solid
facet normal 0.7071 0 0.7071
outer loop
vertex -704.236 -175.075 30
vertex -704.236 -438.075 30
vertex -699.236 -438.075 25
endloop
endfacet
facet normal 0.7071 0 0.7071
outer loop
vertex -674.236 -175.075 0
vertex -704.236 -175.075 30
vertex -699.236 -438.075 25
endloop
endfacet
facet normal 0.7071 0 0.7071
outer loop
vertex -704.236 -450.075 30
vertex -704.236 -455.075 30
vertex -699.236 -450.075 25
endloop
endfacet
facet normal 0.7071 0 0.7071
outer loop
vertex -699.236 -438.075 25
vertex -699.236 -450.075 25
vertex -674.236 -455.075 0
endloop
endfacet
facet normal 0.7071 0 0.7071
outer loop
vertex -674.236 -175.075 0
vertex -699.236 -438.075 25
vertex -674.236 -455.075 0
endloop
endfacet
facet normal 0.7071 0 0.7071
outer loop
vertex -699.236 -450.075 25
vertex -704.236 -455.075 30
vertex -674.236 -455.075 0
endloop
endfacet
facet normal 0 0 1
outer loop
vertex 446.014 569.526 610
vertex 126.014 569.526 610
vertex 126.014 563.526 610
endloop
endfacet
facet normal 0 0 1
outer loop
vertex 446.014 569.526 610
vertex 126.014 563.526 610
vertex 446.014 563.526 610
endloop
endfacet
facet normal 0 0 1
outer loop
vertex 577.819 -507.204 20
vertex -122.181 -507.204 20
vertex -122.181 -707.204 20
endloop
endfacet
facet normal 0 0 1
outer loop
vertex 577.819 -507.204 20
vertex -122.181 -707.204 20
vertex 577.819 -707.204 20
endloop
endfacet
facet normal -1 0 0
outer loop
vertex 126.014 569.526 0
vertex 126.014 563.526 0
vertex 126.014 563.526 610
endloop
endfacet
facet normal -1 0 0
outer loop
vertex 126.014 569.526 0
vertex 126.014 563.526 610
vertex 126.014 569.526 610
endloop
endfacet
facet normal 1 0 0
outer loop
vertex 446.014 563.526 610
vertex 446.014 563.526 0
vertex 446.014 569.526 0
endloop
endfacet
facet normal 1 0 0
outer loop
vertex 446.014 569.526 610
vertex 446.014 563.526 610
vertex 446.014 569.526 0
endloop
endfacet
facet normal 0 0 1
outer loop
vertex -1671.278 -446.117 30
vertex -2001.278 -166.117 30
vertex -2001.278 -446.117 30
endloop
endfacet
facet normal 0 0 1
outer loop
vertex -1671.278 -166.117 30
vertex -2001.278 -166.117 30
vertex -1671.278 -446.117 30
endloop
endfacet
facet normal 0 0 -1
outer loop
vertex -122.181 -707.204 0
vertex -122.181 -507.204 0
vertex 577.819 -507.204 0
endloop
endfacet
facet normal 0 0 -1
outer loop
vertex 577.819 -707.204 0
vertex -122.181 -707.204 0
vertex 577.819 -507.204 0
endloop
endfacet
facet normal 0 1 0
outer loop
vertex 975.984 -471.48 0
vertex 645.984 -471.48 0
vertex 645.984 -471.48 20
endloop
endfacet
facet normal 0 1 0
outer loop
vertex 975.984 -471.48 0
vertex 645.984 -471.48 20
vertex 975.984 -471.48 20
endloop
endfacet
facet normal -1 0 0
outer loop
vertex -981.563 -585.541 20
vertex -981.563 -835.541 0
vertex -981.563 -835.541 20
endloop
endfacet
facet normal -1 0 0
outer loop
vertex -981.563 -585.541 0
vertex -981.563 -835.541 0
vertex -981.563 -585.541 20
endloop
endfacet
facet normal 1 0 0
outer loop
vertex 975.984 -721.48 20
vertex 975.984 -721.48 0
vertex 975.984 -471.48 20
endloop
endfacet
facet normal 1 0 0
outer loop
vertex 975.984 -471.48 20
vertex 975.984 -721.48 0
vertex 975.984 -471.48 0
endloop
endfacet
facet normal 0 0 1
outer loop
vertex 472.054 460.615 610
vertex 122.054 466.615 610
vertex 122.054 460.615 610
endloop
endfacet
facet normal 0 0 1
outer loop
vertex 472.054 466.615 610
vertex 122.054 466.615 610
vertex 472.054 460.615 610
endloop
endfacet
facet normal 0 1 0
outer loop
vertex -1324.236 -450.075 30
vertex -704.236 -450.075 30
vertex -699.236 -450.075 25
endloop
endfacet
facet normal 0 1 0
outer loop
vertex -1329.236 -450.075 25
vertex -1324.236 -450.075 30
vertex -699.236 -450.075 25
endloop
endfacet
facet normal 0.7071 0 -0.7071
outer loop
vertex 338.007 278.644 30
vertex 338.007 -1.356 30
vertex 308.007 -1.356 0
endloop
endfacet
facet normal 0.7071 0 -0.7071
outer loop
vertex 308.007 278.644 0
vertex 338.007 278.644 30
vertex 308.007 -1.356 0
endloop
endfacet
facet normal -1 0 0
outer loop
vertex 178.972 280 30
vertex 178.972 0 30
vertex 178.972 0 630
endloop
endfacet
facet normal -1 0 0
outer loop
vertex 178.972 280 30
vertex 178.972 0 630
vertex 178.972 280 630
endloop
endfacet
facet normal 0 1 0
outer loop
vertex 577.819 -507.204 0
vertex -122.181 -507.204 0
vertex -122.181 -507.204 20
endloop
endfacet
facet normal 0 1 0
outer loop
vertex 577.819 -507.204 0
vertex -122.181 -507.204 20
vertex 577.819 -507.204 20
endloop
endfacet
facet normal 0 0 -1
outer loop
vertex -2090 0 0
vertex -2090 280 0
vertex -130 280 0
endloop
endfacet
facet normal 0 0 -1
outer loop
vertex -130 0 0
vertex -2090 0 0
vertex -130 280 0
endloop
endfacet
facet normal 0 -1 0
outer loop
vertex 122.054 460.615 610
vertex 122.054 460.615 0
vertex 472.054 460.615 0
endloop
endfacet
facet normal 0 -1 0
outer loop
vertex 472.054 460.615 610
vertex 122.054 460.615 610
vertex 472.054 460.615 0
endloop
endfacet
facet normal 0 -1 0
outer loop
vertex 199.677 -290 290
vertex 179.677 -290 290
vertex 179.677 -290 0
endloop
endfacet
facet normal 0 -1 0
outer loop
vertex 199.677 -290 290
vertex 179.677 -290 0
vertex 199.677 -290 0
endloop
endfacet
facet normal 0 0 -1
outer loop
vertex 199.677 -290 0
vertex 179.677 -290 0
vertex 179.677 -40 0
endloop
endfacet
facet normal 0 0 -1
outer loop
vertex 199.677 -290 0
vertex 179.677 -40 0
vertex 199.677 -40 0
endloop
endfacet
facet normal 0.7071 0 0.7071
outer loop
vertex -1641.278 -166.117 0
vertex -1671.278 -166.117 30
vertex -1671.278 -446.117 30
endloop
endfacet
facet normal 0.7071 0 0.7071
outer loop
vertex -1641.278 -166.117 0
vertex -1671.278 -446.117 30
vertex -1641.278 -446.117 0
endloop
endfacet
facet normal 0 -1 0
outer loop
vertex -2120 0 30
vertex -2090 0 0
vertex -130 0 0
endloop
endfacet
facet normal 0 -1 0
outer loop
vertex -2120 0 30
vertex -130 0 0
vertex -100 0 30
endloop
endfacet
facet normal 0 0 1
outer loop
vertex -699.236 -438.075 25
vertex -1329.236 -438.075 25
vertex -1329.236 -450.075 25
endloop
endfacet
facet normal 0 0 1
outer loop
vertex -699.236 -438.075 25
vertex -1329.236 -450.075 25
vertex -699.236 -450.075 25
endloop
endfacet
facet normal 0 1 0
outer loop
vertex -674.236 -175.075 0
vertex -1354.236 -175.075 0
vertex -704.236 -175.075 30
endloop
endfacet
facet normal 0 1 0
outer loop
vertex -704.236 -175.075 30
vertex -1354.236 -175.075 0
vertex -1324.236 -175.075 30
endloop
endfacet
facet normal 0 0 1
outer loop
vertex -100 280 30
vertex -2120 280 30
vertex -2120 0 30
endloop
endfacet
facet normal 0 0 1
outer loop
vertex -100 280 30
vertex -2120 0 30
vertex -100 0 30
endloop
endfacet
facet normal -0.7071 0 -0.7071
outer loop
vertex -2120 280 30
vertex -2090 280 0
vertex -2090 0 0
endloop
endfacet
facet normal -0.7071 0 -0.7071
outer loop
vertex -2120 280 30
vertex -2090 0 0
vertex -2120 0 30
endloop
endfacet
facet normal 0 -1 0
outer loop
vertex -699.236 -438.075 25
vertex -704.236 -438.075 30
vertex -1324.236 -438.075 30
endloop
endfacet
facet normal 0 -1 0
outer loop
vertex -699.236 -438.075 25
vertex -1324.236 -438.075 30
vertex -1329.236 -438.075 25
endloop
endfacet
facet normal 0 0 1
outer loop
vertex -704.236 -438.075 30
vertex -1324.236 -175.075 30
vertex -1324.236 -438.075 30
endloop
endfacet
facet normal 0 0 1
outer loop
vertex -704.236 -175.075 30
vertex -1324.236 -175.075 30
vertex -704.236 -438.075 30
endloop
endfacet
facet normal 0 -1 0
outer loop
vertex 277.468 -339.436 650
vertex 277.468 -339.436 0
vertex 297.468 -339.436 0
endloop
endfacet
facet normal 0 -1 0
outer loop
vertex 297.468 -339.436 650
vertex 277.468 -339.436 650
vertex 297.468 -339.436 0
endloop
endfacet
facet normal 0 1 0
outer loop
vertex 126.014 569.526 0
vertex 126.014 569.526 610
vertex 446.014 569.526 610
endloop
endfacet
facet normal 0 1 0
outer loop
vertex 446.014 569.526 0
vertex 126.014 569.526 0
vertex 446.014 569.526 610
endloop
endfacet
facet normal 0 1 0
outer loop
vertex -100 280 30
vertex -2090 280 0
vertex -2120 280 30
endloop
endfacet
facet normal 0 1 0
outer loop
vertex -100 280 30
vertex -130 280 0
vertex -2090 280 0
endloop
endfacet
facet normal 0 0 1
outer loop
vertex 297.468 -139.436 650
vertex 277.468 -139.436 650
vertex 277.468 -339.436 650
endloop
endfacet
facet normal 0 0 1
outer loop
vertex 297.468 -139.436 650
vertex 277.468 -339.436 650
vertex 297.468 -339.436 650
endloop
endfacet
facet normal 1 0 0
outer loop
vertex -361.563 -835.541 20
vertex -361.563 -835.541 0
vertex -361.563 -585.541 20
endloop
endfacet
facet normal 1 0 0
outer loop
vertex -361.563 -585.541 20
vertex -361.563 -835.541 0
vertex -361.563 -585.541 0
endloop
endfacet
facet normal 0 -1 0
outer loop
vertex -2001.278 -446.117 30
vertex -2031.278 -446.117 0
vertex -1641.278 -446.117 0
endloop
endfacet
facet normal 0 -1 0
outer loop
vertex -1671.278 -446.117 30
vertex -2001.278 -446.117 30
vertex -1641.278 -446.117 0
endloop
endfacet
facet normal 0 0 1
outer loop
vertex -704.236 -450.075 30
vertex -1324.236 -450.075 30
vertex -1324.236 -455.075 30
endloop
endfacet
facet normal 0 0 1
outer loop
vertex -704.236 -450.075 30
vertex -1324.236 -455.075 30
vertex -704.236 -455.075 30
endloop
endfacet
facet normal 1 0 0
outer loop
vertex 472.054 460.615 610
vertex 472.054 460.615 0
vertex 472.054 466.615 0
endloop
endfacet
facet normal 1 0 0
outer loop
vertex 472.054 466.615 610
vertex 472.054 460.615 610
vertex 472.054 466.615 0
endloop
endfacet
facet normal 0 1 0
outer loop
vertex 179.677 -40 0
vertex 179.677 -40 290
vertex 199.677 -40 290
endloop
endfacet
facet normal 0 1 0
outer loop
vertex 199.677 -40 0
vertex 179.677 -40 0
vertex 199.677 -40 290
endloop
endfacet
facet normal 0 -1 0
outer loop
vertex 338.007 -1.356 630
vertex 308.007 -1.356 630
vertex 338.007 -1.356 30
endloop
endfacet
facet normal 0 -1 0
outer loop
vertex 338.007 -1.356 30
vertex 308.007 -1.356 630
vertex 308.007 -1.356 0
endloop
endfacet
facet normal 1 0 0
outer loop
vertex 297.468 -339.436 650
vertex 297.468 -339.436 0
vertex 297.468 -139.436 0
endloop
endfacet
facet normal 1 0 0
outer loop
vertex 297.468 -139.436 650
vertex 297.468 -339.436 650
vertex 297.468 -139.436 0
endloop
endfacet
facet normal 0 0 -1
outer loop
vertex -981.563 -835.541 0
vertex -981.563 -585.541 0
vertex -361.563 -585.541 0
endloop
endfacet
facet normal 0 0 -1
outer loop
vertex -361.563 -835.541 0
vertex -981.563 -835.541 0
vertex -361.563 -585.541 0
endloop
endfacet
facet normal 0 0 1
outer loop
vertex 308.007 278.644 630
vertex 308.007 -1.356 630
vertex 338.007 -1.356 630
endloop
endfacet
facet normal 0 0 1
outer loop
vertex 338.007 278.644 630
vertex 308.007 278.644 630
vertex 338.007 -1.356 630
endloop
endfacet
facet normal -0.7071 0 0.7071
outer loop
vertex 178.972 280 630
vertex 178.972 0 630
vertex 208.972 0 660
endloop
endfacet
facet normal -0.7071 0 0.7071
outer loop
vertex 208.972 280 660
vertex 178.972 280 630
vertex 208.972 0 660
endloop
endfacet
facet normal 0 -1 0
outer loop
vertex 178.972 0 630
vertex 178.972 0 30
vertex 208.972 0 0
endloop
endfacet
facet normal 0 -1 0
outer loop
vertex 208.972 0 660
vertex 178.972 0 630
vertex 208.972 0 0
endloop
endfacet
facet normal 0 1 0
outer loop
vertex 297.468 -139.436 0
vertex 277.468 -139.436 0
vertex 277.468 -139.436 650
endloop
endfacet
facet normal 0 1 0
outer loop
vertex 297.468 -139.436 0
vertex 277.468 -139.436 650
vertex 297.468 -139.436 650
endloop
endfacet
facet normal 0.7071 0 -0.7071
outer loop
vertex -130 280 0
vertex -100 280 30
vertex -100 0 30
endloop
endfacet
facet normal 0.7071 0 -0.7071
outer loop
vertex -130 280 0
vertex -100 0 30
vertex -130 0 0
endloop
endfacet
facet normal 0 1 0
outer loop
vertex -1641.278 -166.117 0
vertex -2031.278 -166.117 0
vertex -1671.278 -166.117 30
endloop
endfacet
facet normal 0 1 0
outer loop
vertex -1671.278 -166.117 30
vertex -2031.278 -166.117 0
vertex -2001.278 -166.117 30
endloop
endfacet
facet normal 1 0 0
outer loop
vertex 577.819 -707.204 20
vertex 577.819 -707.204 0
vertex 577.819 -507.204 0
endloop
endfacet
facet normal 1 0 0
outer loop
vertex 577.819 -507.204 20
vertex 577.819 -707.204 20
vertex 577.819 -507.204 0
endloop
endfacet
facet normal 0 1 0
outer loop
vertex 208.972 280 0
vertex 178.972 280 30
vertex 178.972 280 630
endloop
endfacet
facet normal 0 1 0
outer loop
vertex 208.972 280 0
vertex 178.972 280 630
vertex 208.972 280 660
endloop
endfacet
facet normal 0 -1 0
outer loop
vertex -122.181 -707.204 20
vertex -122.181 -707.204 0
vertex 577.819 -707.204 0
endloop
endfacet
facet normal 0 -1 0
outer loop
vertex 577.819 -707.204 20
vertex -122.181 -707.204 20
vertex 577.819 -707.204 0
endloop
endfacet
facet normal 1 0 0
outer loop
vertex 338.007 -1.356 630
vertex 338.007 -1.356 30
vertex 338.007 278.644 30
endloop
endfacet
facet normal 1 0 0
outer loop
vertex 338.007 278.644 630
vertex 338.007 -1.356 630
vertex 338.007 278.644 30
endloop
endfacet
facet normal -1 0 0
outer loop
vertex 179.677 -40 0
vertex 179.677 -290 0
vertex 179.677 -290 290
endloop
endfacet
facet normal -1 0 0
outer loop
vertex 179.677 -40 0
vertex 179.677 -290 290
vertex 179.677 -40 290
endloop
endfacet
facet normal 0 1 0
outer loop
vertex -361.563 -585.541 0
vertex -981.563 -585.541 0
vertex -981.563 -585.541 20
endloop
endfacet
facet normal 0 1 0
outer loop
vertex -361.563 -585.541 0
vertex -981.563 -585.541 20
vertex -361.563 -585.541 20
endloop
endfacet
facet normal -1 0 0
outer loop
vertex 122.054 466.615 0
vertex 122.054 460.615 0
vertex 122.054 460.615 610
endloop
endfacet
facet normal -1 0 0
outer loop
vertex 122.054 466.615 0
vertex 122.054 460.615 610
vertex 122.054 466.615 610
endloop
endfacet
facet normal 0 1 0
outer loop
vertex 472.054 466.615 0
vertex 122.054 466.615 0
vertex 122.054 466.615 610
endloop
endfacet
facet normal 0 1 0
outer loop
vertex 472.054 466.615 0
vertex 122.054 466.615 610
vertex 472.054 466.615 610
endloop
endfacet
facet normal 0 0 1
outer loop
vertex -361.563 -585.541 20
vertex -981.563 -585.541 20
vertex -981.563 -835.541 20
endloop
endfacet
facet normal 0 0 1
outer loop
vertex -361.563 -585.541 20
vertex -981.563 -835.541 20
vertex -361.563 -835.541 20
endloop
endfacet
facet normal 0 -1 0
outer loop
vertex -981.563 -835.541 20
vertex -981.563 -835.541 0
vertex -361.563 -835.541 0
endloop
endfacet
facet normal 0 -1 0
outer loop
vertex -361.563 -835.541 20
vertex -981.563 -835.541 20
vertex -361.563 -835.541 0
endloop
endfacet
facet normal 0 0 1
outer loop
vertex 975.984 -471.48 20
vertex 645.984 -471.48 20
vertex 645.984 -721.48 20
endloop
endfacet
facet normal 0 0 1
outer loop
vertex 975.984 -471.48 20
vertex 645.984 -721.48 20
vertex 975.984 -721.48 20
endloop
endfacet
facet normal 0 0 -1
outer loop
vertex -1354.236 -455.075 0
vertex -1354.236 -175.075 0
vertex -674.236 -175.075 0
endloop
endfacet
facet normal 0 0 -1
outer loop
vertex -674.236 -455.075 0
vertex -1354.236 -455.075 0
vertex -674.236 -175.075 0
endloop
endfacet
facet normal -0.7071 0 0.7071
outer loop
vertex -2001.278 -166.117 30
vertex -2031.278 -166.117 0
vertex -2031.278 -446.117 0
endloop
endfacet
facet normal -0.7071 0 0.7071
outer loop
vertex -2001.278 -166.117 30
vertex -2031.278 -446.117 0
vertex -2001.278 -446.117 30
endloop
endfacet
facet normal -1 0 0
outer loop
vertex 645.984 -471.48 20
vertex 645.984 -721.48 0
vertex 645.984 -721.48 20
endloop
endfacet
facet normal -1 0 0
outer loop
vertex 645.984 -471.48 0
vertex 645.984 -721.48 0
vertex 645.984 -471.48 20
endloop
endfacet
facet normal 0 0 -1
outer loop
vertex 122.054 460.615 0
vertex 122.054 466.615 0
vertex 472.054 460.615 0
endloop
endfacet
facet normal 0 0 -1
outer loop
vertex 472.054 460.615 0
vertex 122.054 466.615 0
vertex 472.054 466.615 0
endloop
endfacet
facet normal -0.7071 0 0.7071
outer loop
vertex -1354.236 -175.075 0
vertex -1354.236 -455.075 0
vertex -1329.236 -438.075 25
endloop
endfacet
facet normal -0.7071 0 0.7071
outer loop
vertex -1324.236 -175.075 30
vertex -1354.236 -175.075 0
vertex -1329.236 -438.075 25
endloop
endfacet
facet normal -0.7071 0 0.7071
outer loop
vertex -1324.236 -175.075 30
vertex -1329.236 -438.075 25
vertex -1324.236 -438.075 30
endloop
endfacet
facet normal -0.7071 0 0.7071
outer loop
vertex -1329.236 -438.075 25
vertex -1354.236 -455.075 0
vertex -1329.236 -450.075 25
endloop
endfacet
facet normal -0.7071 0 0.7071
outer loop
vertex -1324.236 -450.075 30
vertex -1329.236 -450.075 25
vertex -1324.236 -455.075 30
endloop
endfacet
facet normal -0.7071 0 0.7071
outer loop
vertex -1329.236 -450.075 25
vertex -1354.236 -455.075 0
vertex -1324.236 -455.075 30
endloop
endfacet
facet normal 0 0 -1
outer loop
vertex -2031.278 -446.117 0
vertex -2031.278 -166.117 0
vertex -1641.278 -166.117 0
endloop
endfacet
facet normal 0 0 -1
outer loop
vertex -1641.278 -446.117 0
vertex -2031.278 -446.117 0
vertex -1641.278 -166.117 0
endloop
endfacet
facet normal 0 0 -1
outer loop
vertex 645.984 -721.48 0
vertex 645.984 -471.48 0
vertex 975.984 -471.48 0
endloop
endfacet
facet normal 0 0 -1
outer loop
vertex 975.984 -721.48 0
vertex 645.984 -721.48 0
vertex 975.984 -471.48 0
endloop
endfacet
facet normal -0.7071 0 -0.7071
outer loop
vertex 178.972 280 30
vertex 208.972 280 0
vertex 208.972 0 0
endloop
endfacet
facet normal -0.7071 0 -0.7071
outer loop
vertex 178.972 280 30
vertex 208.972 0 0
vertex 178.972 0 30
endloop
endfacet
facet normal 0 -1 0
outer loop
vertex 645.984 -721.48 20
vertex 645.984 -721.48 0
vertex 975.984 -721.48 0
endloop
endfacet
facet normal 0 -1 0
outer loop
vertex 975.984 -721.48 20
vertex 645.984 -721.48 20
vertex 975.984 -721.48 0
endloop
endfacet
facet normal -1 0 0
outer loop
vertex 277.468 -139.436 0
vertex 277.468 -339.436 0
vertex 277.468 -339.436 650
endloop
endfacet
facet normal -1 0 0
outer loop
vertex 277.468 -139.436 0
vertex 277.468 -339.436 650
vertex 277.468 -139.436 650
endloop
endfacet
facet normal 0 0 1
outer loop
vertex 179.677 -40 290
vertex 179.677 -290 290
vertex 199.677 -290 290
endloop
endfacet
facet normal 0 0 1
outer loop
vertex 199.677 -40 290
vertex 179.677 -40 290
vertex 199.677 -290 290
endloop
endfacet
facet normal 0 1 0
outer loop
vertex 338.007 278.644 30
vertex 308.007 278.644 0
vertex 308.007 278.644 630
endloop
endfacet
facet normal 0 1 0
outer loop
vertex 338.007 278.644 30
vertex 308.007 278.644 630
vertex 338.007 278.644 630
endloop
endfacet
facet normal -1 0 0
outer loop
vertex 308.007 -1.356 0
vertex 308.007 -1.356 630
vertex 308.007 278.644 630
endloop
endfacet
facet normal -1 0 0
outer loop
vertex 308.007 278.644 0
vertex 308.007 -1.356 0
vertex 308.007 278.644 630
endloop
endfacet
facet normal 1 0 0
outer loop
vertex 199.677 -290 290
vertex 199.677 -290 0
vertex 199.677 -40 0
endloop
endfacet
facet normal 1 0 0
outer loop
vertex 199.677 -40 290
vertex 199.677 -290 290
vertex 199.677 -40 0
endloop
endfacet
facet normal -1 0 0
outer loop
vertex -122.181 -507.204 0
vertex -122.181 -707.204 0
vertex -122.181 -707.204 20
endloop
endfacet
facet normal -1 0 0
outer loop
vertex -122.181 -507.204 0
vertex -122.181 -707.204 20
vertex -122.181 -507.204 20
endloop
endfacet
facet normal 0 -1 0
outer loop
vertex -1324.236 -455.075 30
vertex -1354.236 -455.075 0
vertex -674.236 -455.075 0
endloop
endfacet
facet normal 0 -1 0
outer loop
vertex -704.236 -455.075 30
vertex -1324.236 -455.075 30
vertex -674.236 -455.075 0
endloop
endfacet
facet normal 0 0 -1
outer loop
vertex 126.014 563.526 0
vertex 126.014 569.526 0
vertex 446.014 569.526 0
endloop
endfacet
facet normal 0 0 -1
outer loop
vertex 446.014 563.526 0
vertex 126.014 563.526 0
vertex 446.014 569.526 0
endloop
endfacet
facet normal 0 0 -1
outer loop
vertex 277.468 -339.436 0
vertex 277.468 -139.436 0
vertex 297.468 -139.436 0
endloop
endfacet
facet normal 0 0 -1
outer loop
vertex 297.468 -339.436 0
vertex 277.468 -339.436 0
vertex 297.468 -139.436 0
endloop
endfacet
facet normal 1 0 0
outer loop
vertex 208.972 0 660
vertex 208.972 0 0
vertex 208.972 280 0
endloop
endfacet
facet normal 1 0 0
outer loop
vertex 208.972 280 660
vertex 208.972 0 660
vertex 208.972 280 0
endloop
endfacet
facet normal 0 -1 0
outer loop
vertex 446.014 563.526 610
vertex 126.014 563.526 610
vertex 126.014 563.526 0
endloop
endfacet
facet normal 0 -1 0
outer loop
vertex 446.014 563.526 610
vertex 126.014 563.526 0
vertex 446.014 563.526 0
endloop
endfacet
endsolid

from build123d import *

# Parameters (mm, degrees)
F0_W      = 2020
F0_H      = 280
F1_DEPTH  = 30
F2_W      = 30
F2_H      = 280
F3_DEPTH  = 660
F5_DEPTH  = 380
F7_DEPTH  = 380
F8_W      = 680
F8_H      = 280
F9_DEPTH  = 30
F10_W     = 20
F10_H     = 250
F11_DEPTH = 290
F12_W     = 30
F12_H     = 280
F13_DEPTH = 630
F15_DEPTH = 380
F17_DEPTH = 380
F18_W     = 390
F18_H     = 280
F19_DEPTH = 30
F21_DEPTH = 380
F22_W     = 760
F22_H     = 12
F23_DEPTH = 5
F24_W     = 350
F24_H     = 6
F25_DEPTH = 610
F26_W     = 620
F26_H     = 250
F27_DEPTH = 20
F28_W     = 20
F28_H     = 200
F29_DEPTH = 650
F30_W     = 700
F30_H     = 200
F31_DEPTH = 20
F32_W     = 330
F32_H     = 250
F33_DEPTH = 20
F34_W     = 320
F34_H     = 6
F35_DEPTH = 610


with BuildPart() as f1:
    # F0 (on Top) → F1 (new body)
    with BuildSketch(Plane.XY):
        with Locations((-1110, 140)):
            Rectangle(F0_W, F0_H)
    extrude(amount=F1_DEPTH)

    # F4 (on face) → F5 (cut)
    with BuildSketch(Plane.XZ):
        Polygon((-2090, 0), (-2120, 30), (-2120, 0), align=None)
        Polygon((-100, 0), (-100, 30), (-130, 0), align=None)
    extrude(amount=-F5_DEPTH, mode=Mode.SUBTRACT)


with BuildPart() as f3:
    # F2 (on Top) → F3 (new body)
    with BuildSketch(Plane.XY):
        with Locations((193.972067, 140)):
            Rectangle(F2_W, F2_H)
    extrude(amount=F3_DEPTH)

    # F6 (on face) → F7 (cut)
    with BuildSketch(Plane.XZ):
        Polygon((178.972067, 630), (208.972067, 660), (178.972067, 660), align=None)
        Polygon((178.972067, 0), (208.972067, 0), (178.972067, 30), align=None)
    extrude(amount=-F7_DEPTH, mode=Mode.SUBTRACT)


with BuildPart() as f9:
    # F8 (on Top) → F9 (new body)
    with BuildSketch(Plane.XY):
        with Locations((-1014.235584, -315.075242)):
            Rectangle(F8_W, F8_H)
    extrude(amount=F9_DEPTH)

    # F16 (on face) → F17 (cut)
    with BuildSketch(Plane.XZ.offset(455.075242)):
        Polygon((-1324.235584, 30), (-1354.235584, 30), (-1354.235584, 0), align=None)
        Polygon((-674.235584, 0), (-674.235584, 30), (-704.235584, 30), align=None)
    extrude(amount=-F17_DEPTH, mode=Mode.SUBTRACT)

    # F22 (on face) → F23 (cut)
    with BuildSketch(Plane.XY.offset(30)):
        with Locations((-1054.235584, -444.075242)):
            Rectangle(F22_W, F22_H)
    extrude(amount=-F23_DEPTH, mode=Mode.SUBTRACT)


with BuildPart() as f11:
    # F10 (on Top) → F11 (new body)
    with BuildSketch(Plane.XY):
        with Locations((189.676665, -165)):
            Rectangle(F10_W, F10_H)
    extrude(amount=F11_DEPTH)


with BuildPart() as f13:
    # F12 (on Top) → F13 (new body)
    with BuildSketch(Plane.XY):
        with Locations((323.007107, 138.644105)):
            Rectangle(F12_W, F12_H)
    extrude(amount=F13_DEPTH)

    # F14 (on face) → F15 (cut)
    with BuildSketch(Plane.XZ.offset(1.355895)):
        Polygon((338.007107, 30), (308.007107, 0), (338.007107, 0), align=None)
    extrude(amount=-F15_DEPTH, mode=Mode.SUBTRACT)


with BuildPart() as f19:
    # F18 (on Top) → F19 (new body)
    with BuildSketch(Plane.XY):
        with Locations((-1836.277942, -306.116726)):
            Rectangle(F18_W, F18_H)
    extrude(amount=F19_DEPTH)

    # F20 (on face) → F21 (cut)
    with BuildSketch(Plane.XZ.offset(446.116726)):
        Polygon((-2031.277942, 30), (-2031.277942, 0), (-2001.277942, 30), align=None)
        Polygon((-1671.277942, 30), (-1641.277942, 0), (-1641.277942, 30), align=None)
    extrude(amount=-F21_DEPTH, mode=Mode.SUBTRACT)


with BuildPart() as f25:
    # F24 (on Top) → F25 (new body)
    with BuildSketch(Plane.XY):
        with Locations((297.053664, 463.615045)):
            Rectangle(F24_W, F24_H)
    extrude(amount=F25_DEPTH)


with BuildPart() as f27:
    # F26 (on Top) → F27 (new body)
    with BuildSketch(Plane.XY):
        with Locations((-671.562884, -710.54064)):
            Rectangle(F26_W, F26_H)
    extrude(amount=F27_DEPTH)


with BuildPart() as f29:
    # F28 (on Top) → F29 (new body)
    with BuildSketch(Plane.XY):
        with Locations((287.467837, -239.435571)):
            Rectangle(F28_W, F28_H)
    extrude(amount=F29_DEPTH)


with BuildPart() as f31:
    # F30 (on Top) → F31 (new body)
    with BuildSketch(Plane.XY):
        with Locations((227.819499, -607.203731)):
            Rectangle(F30_W, F30_H)
    extrude(amount=F31_DEPTH)


with BuildPart() as f33:
    # F32 (on Top) → F33 (new body)
    with BuildSketch(Plane.XY):
        with Locations((810.984224, -596.480411)):
            Rectangle(F32_W, F32_H)
    extrude(amount=F33_DEPTH)


with BuildPart() as f35:
    # F34 (on Top) → F35 (new body)
    with BuildSketch(Plane.XY):
        with Locations((286.014318, 566.526479)):
            Rectangle(F34_W, F34_H)
    extrude(amount=F35_DEPTH)


solid = Compound([f1.part, f3.part, f9.part, f11.part, f13.part, f19.part, f25.part, f27.part, f29.part, f31.part, f33.part, f35.part])
